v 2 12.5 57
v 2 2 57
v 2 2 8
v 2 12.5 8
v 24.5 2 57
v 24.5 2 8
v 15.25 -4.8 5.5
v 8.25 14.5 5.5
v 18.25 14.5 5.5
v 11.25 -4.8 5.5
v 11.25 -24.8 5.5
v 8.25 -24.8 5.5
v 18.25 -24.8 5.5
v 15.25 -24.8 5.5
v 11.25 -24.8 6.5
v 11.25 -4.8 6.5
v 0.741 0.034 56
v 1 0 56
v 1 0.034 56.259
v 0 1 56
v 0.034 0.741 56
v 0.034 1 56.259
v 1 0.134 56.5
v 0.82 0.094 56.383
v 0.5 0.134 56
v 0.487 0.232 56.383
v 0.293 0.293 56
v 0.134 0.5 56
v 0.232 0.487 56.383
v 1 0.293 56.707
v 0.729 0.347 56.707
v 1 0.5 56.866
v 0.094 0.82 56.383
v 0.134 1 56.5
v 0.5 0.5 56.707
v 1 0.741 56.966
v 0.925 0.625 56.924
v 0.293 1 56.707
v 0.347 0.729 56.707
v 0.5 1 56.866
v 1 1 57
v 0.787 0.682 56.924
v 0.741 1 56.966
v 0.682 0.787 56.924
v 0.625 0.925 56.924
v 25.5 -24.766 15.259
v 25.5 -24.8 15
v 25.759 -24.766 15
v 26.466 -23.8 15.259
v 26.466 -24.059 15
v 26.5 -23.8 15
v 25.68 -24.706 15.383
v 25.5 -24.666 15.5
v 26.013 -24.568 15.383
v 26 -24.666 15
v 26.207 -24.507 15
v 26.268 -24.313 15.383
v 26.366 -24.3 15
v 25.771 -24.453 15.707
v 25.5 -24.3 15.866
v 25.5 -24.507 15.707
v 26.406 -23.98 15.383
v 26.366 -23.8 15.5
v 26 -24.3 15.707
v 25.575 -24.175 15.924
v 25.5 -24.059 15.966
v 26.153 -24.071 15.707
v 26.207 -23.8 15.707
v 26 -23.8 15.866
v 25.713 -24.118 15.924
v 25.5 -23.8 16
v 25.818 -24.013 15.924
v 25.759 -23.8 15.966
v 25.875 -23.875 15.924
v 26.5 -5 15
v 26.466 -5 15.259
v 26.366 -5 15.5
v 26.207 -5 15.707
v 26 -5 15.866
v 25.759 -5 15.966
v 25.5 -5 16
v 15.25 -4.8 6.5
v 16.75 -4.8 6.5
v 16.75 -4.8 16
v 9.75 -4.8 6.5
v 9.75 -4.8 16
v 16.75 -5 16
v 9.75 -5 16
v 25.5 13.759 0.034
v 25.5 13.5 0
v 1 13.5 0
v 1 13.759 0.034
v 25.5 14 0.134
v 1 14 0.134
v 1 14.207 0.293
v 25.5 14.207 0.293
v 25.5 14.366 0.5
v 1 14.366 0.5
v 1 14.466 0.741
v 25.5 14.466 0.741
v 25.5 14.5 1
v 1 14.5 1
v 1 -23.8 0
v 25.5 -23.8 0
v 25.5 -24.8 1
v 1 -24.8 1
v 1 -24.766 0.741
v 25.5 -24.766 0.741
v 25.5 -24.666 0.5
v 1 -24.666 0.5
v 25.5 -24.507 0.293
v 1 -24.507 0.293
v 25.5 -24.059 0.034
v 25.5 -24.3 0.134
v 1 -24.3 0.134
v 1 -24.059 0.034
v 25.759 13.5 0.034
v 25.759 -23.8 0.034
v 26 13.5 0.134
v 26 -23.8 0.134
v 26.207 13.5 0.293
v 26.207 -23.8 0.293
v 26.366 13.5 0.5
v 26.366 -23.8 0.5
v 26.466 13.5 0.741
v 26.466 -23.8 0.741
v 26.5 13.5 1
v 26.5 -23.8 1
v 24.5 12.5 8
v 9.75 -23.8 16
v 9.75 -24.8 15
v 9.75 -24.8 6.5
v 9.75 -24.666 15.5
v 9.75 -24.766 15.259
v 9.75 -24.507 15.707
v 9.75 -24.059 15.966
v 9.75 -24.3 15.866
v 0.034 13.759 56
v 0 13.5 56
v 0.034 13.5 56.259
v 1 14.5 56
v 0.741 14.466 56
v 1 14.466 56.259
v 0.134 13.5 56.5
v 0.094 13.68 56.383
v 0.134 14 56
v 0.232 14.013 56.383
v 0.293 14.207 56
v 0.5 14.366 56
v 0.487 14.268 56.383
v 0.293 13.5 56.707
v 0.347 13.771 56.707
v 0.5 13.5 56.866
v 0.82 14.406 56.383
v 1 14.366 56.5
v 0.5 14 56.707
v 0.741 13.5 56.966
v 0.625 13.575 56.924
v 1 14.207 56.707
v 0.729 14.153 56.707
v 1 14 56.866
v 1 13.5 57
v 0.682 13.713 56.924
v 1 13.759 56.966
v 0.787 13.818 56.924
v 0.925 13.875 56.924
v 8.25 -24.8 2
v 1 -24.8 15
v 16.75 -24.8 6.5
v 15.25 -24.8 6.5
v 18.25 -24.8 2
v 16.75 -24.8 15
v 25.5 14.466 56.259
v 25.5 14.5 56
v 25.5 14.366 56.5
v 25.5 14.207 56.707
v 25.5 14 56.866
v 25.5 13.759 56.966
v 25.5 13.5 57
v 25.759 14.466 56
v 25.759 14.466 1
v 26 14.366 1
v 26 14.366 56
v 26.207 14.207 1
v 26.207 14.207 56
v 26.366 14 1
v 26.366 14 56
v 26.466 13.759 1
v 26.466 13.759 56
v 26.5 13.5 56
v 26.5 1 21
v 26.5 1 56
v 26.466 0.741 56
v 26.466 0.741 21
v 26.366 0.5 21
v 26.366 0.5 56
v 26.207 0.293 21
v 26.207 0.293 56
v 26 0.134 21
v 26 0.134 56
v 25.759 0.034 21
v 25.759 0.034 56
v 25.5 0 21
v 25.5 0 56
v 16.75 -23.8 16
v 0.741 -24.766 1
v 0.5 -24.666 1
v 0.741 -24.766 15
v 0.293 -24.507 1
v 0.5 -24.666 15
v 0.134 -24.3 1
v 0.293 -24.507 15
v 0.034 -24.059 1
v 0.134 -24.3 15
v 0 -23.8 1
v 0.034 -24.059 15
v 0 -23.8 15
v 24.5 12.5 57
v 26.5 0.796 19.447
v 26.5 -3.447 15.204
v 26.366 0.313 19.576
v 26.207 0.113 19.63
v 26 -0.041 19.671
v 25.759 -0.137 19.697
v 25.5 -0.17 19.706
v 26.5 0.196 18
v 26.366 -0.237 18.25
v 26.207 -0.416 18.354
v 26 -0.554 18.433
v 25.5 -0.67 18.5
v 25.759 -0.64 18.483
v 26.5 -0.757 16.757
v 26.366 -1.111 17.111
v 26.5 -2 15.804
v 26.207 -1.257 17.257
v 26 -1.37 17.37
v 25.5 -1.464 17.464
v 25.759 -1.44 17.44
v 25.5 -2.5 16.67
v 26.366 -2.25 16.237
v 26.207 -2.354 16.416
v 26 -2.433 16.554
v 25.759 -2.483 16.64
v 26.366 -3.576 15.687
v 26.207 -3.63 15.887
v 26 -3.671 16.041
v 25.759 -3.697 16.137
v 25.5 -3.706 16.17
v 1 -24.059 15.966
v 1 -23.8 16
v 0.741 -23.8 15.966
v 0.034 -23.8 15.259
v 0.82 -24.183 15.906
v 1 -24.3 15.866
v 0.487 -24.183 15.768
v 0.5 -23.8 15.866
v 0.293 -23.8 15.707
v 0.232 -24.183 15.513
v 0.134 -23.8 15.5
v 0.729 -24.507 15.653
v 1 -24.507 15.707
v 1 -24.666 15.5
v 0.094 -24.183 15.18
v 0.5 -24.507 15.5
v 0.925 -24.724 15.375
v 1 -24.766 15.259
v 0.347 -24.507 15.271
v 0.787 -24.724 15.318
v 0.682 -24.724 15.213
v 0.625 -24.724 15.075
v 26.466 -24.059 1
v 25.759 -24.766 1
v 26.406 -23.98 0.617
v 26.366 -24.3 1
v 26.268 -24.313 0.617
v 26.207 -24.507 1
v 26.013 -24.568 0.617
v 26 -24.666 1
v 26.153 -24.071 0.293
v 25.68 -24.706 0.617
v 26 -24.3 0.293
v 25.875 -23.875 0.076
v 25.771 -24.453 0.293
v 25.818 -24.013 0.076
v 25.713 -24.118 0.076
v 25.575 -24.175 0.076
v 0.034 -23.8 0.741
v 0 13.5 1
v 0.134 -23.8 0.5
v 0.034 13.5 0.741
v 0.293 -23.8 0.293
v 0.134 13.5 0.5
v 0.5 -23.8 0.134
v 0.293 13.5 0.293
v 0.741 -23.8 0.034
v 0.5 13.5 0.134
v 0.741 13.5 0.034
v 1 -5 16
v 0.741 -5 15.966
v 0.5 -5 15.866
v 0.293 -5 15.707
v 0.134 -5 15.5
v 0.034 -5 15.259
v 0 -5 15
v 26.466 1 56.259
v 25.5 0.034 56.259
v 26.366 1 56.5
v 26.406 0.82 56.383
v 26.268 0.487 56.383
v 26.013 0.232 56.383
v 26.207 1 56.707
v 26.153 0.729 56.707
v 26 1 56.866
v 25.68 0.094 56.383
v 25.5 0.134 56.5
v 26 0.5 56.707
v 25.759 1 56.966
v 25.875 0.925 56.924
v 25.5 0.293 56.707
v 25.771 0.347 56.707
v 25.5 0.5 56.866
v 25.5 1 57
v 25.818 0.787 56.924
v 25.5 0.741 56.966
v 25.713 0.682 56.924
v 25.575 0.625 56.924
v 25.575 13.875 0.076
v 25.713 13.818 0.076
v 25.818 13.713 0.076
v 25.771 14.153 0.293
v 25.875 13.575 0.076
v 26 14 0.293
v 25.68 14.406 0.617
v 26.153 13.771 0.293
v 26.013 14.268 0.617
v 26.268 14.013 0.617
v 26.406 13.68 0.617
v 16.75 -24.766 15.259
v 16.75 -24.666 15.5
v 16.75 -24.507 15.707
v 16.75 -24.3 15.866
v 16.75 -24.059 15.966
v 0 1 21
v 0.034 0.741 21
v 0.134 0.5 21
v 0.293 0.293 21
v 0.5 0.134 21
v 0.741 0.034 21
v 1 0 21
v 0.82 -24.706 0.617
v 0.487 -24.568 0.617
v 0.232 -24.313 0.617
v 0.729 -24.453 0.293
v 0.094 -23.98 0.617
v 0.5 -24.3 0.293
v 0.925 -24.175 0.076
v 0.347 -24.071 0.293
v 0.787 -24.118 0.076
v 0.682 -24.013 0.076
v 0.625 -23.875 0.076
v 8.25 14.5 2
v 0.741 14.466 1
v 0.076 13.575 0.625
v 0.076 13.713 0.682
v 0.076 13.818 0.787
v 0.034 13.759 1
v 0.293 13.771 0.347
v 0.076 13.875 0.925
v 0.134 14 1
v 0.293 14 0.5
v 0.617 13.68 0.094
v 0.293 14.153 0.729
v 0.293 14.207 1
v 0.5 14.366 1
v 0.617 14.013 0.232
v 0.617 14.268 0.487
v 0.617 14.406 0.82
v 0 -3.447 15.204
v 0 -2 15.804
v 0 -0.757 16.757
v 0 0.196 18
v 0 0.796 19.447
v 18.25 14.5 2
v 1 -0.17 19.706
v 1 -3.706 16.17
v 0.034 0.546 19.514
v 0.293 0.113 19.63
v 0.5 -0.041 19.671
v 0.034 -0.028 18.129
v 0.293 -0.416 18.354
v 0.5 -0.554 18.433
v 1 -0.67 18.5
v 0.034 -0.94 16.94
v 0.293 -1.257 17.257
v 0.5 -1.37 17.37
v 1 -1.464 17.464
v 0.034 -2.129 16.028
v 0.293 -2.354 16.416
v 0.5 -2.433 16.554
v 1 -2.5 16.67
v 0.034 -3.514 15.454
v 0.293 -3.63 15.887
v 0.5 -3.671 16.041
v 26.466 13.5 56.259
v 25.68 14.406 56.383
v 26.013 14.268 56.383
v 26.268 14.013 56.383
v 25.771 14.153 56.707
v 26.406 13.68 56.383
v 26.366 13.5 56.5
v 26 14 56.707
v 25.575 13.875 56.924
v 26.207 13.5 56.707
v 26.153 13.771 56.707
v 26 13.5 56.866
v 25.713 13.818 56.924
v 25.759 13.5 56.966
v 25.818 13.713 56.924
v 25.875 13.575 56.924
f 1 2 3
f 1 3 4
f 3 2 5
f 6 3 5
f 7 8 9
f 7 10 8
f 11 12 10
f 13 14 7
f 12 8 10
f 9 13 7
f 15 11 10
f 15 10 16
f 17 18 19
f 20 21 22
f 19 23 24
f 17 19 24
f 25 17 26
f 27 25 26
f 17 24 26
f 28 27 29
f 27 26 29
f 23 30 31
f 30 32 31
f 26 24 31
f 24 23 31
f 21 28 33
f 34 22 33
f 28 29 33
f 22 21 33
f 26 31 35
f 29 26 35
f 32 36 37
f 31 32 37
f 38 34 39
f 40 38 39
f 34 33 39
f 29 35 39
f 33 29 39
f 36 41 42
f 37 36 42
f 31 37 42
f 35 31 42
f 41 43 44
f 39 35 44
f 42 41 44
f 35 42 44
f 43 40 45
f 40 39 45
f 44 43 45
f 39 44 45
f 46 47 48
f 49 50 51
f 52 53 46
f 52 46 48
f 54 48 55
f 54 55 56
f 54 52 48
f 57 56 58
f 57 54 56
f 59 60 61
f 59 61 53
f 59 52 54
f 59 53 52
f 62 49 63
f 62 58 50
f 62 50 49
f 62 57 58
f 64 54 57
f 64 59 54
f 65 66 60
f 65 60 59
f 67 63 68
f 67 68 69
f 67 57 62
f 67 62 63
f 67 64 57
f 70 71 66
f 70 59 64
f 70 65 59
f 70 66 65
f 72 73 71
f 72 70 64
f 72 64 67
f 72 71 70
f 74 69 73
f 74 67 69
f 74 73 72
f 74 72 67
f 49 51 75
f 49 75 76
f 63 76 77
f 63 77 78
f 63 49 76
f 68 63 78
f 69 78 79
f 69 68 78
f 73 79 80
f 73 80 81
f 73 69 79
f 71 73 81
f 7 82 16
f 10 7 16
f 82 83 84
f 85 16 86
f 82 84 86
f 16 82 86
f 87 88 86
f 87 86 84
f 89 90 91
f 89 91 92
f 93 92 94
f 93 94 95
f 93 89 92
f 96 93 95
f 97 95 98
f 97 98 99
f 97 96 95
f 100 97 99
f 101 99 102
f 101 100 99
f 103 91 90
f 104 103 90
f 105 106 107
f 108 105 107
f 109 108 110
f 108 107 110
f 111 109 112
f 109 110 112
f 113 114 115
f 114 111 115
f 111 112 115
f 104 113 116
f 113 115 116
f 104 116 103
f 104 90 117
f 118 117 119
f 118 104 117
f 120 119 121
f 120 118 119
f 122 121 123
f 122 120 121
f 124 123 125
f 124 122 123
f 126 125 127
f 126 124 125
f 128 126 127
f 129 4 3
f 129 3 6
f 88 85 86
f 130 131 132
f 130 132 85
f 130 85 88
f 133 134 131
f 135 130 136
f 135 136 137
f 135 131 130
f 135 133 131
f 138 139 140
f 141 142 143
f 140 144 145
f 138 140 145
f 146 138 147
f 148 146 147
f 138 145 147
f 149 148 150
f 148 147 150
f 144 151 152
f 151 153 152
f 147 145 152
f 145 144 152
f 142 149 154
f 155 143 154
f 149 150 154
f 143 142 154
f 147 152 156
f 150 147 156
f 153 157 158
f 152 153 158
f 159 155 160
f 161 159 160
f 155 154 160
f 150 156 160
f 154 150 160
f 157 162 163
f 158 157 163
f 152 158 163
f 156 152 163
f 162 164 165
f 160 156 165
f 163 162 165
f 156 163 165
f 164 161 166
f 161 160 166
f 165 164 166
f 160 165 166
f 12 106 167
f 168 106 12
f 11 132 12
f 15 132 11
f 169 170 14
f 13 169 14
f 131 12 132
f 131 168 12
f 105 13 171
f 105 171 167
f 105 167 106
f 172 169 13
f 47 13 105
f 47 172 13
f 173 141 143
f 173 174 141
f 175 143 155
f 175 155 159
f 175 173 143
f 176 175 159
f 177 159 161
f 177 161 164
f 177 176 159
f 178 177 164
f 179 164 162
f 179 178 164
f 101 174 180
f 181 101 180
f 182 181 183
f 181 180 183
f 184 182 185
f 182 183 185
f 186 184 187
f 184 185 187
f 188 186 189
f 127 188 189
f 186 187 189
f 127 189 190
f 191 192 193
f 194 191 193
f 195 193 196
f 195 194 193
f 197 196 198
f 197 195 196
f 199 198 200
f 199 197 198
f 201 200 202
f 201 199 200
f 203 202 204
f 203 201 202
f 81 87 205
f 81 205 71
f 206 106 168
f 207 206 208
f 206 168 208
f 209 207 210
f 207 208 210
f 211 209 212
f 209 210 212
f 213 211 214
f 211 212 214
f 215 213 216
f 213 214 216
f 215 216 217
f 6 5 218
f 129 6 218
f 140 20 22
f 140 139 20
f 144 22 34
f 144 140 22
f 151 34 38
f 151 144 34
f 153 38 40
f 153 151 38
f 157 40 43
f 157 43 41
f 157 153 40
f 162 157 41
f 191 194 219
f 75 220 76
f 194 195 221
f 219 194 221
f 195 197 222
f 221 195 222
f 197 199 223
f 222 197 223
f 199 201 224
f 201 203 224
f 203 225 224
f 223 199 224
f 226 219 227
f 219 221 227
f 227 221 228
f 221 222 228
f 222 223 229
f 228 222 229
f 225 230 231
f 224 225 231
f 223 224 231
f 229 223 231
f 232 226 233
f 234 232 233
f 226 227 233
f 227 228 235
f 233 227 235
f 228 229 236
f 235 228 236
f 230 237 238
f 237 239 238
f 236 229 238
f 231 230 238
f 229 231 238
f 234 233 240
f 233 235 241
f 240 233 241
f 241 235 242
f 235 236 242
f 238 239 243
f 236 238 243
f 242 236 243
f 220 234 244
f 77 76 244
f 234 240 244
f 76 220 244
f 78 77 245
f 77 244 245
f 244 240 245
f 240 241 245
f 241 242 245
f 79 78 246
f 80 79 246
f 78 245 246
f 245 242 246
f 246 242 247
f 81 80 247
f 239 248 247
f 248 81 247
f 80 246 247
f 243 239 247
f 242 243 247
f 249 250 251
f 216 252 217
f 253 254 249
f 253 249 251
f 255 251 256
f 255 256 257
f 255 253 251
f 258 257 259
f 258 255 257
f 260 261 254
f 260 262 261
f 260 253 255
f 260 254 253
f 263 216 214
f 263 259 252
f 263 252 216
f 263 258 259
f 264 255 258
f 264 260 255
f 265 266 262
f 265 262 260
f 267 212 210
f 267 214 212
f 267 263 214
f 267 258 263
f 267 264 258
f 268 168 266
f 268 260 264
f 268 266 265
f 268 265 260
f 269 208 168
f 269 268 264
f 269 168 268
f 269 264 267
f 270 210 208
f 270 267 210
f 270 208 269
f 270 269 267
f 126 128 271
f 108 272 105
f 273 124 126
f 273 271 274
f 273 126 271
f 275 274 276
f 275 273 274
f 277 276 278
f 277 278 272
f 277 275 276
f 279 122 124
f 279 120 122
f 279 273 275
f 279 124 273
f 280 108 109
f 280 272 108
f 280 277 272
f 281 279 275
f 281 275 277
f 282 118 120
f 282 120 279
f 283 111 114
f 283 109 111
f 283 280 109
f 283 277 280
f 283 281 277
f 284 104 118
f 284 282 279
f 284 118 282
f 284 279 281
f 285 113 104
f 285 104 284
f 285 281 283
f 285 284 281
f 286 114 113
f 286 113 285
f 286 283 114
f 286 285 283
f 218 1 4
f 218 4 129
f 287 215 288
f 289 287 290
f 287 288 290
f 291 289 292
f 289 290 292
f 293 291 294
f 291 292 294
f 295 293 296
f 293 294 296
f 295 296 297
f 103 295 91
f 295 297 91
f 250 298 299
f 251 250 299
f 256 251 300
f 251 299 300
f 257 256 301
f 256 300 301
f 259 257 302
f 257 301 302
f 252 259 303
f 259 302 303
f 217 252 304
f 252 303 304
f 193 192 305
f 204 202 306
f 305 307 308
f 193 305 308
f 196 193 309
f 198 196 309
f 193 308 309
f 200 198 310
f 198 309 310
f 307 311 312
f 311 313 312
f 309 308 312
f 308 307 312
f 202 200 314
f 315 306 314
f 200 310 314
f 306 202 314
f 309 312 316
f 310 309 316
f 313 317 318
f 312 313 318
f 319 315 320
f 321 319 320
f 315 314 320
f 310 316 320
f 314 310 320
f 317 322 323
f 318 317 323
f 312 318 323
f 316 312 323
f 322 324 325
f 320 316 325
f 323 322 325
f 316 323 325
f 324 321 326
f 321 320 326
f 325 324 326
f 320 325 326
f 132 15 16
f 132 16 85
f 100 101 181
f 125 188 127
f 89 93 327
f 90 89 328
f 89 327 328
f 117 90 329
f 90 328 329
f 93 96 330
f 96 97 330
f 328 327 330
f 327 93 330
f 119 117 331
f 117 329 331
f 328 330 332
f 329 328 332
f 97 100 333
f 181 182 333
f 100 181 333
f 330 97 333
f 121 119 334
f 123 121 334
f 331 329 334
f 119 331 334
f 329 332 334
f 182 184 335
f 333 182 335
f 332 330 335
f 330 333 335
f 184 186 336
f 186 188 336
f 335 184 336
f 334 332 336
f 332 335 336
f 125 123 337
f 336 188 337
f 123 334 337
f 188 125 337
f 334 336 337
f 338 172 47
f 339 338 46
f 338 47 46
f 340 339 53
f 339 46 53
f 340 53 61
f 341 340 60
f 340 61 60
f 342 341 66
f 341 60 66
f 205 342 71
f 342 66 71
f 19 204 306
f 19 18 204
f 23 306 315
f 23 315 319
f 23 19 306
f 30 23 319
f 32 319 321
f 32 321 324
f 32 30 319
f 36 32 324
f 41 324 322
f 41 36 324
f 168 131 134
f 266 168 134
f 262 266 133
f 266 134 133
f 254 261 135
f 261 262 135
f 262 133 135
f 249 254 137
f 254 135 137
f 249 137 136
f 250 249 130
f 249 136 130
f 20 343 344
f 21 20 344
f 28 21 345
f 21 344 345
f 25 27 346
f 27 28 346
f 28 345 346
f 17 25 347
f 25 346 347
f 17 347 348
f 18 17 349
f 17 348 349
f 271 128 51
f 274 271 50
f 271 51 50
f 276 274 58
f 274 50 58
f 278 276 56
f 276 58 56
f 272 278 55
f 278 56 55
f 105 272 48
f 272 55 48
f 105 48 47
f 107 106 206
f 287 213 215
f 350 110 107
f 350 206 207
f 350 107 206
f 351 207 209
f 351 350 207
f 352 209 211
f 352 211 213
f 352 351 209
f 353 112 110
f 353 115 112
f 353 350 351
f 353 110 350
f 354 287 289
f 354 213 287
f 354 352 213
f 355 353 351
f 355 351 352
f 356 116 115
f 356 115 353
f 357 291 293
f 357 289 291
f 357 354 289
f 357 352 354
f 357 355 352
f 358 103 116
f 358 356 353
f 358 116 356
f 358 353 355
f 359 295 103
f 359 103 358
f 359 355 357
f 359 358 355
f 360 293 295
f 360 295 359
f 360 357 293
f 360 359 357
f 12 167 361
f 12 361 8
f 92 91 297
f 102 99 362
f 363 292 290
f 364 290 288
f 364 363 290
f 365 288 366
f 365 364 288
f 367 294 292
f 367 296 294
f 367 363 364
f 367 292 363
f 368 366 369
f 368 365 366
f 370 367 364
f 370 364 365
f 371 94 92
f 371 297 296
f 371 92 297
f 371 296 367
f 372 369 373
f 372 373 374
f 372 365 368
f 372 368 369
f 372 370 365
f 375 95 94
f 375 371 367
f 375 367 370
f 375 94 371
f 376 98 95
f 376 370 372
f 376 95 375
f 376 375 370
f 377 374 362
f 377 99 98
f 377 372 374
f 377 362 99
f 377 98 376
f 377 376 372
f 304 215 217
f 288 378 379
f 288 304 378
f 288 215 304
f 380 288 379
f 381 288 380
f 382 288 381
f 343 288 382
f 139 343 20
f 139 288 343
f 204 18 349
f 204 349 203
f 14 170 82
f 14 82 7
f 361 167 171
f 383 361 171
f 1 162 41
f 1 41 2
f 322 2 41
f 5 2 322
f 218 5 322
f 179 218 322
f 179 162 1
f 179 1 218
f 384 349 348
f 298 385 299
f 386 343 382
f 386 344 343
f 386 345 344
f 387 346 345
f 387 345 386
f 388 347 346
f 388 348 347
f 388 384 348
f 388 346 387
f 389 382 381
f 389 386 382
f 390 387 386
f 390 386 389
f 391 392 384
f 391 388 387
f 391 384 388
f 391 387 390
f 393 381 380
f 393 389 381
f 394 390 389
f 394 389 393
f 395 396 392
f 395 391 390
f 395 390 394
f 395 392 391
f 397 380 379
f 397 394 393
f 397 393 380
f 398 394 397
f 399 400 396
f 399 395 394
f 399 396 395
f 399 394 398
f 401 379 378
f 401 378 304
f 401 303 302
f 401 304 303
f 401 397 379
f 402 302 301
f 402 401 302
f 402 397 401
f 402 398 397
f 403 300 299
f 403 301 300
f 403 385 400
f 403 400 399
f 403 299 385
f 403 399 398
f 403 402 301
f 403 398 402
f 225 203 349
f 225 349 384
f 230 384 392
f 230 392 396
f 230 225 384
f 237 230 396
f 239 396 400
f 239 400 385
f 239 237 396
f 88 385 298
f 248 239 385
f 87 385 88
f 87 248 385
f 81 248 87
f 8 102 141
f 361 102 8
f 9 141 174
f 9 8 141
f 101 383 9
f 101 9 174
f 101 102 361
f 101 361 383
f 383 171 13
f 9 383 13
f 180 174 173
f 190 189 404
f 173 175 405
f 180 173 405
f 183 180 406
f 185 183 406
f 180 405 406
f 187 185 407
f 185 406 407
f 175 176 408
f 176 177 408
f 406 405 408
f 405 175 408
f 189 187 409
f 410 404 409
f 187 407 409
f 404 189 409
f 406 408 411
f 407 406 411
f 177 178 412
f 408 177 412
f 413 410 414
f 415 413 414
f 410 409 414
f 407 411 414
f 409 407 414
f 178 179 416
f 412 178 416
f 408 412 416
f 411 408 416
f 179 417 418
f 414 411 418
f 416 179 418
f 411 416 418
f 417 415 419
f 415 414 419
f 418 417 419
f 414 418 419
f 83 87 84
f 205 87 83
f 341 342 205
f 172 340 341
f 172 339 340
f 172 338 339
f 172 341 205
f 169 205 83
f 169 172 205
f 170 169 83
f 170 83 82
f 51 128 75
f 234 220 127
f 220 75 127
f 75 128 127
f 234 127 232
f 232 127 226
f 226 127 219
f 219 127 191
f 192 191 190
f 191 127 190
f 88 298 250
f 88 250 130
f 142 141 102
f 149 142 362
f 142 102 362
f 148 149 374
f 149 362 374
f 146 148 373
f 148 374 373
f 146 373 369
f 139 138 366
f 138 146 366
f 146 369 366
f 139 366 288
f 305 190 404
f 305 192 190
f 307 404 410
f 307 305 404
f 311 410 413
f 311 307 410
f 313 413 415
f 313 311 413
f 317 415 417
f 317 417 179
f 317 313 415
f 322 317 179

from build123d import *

# Parameters (mm, degrees)
SKETCH_2_W          = 26.5
SKETCH_2_H          = 14.5
EXTRUDE_1_DEPTH     = 57
SKETCH_6_W          = 22.5
SKETCH_6_H          = 10.5
CUT_EXTRUDE_1_DEPTH = 49
SKETCH_7_W          = 26.5
SKETCH_7_H          = 16
EXTRUDE_2_DEPTH     = 24.8
FILLET_1_R          = 5
FILLET_2_R          = 1
FILLET_4_R          = 1
FILLET_5_R          = 1
FILLET_6_R          = 1
CUT_EXTRUDE_2_DEPTH = 20
SKETCH_10_W         = 10
SKETCH_10_H         = 3.5
CUT_EXTRUDE_3_DEPTH = 40


with BuildPart() as part:
    # ｽｹｯﾁ2 → ﾎﾞｽ - 押し出し1 (new body)
    with BuildSketch(Plane.XY):
        with Locations((13.25, 7.25)):
            Rectangle(SKETCH_2_W, SKETCH_2_H)
    extrude(amount=EXTRUDE_1_DEPTH)

    # ｽｹｯﾁ6 → ｶｯﾄ - 押し出し1 (cut)
    with BuildSketch(Plane.XY.offset(57)):
        with Locations((13.25, 7.25)):
            Rectangle(SKETCH_6_W, SKETCH_6_H)
    extrude(amount=-CUT_EXTRUDE_1_DEPTH, mode=Mode.SUBTRACT)

    # ｽｹｯﾁ7 → ﾎﾞｽ - 押し出し2 (add)
    with BuildSketch(Plane.XZ):
        with Locations((13.25, 8)):
            Rectangle(SKETCH_7_W, SKETCH_7_H)
    extrude(amount=EXTRUDE_2_DEPTH)

    # ﾌｨﾚｯﾄ1
    fillet_1_edges = [part.edges().sort_by_distance(p)[0] for p in [
        (13.25, 0, 16),
    ]]
    fillet(fillet_1_edges, radius=FILLET_1_R)

    # ﾌｨﾚｯﾄ2
    fillet_2_edges = [part.edges().sort_by_distance(p)[0] for p in [
        (26.5, 14.5, 28.5),
    ]]
    fillet(fillet_2_edges, radius=FILLET_2_R)

    # ﾌｨﾚｯﾄ4
    fillet_4_edges = [part.edges().sort_by_distance(p)[0] for p in [
        (26.5, -14.9, 16),
        (26.5, -24.8, 8),
        (26.5, -1.464466094, 17.464466094),
        (12.75, 14.5, 0),
        (26.207106781, 14.207106781, 0),
        (26.5, -5.65, 0),
        (26.5, 0, 39),
    ]]
    fillet(fillet_4_edges, radius=FILLET_4_R)

    # ﾌｨﾚｯﾄ5
    # the kernel refuses this fillet: 1 mm, written as the material it takes off along each edge
    with BuildSketch(Plane(origin=(25.5, -23.8, 15), x_dir=(0, -1, 0), z_dir=(0, 0, 1))) as fillet_5_piece_1_section:
        Polygon((0, 0), (FILLET_5_R, 0), (FILLET_5_R, FILLET_5_R), (0, FILLET_5_R), align=None)
    fillet_5_piece_1 = extrude(amount=FILLET_5_R, mode=Mode.PRIVATE)
    fillet_5_piece_1 = fillet_5_piece_1 - Plane(origin=(25.5, -23.8, 15), x_dir=(-0.7071067811865475, 0.7071067811865475, 0), z_dir=(0, 0, 1)) * Sphere(FILLET_5_R, mode=Mode.PRIVATE)
    add(fillet_5_piece_1, mode=Mode.SUBTRACT)
    with BuildSketch(Plane(origin=(25.5, -23.8, 1), x_dir=(0, -1, 0), z_dir=(0, 0, -1))) as fillet_5_piece_2_section:
        Polygon((0, 0), (FILLET_5_R, 0), (FILLET_5_R, -FILLET_5_R), (0, -FILLET_5_R), align=None)
    fillet_5_piece_2 = extrude(amount=FILLET_5_R, mode=Mode.PRIVATE)
    fillet_5_piece_2 = fillet_5_piece_2 - Plane(origin=(25.5, -23.8, 1), x_dir=(-0.7071067811865475, 0.7071067811865475, 0), z_dir=(0, 0, -1)) * Sphere(FILLET_5_R, mode=Mode.PRIVATE)
    add(fillet_5_piece_2, mode=Mode.SUBTRACT)
    with BuildSketch(Plane(origin=(1, -23.8, 15), x_dir=(-1, 0, 0), z_dir=(0, -1, 0))) as fillet_5_piece_3_section:
        Polygon((0, 0), (FILLET_5_R, 0), (FILLET_5_R, -FILLET_5_R), (0, -FILLET_5_R), align=None)
    fillet_5_piece_3 = extrude(amount=FILLET_5_R, mode=Mode.PRIVATE)
    fillet_5_piece_3 = fillet_5_piece_3 - Plane(origin=(1, -23.8, 15), x_dir=(0.7071067811865475, 0, -0.7071067811865475), z_dir=(0, -1, 0)) * Sphere(FILLET_5_R, mode=Mode.PRIVATE)
    add(fillet_5_piece_3, mode=Mode.SUBTRACT)
    with BuildSketch(Plane(origin=(1, -23.8, 1), x_dir=(-1, 0, 0), z_dir=(0, 0, -1))) as fillet_5_piece_4_section:
        Polygon((0, 0), (FILLET_5_R, 0), (FILLET_5_R, -FILLET_5_R), (0, -FILLET_5_R), align=None)
    fillet_5_piece_4 = extrude(amount=FILLET_5_R, mode=Mode.PRIVATE)
    fillet_5_piece_4 = fillet_5_piece_4 - Plane(origin=(1, -23.8, 1), x_dir=(0.7071067811865475, 0.7071067811865475, 0), z_dir=(0, 0, -1)) * Sphere(FILLET_5_R, mode=Mode.PRIVATE)
    add(fillet_5_piece_4, mode=Mode.SUBTRACT)
    with BuildSketch(Plane(origin=(0, -5, 16), x_dir=(0, 0, -1), z_dir=(0, -1, 0))) as fillet_5_piece_5:
        with BuildLine():
            CenterArc((FILLET_5_R, FILLET_5_R), FILLET_5_R, 180, 90)
            Line((0, FILLET_5_R), (0, 0))
            Line((0, 0), (FILLET_5_R, 0))
        make_face()
    extrude(amount=18.8, mode=Mode.SUBTRACT)
    with BuildSketch(Plane(origin=(0, -24.8, 15), x_dir=(0, 1, 0), z_dir=(0, 0, -1))) as fillet_5_piece_6:
        with BuildLine():
            CenterArc((FILLET_5_R, FILLET_5_R), FILLET_5_R, 180, 90)
            Line((0, FILLET_5_R), (0, 0))
            Line((0, 0), (FILLET_5_R, 0))
        make_face()
    extrude(amount=14, mode=Mode.SUBTRACT)
    with BuildSketch(Plane(origin=(1, -24.8, 0), x_dir=(0, 1, 0), z_dir=(1, 0, 0)), Plane(origin=(25.5, -24.8, 16), x_dir=(0, 1, 0), z_dir=(-1, 0, 0))) as fillet_5_piece_7:
        with BuildLine():
            CenterArc((FILLET_5_R, FILLET_5_R), FILLET_5_R, 180, 90)
            Line((0, FILLET_5_R), (0, 0))
            Line((0, 0), (FILLET_5_R, 0))
        make_face()
    extrude(amount=24.5, mode=Mode.SUBTRACT)
    with BuildSketch(Plane(origin=(0, -5, 21), x_dir=(0, 1, 0), z_dir=(0, 0, 1))) as fillet_5_piece_8:
        with BuildLine():
            CenterArc((5 + FILLET_5_R, -FILLET_5_R), FILLET_5_R, 90, 90)
            Line((5, -FILLET_5_R), (5, 0))
            Line((5, 0), (5 + FILLET_5_R, 0))
        make_face()
    revolve(axis=Axis((0, -5, 21), (-1, 0, 0)), revolution_arc=90, mode=Mode.SUBTRACT)
    with BuildSketch(Plane(origin=(0, 13.5, 0), x_dir=(0, 0, 1), z_dir=(0, -1, 0))) as fillet_5_piece_9:
        with BuildLine():
            CenterArc((FILLET_5_R, -FILLET_5_R), FILLET_5_R, 90, 90)
            Line((0, -FILLET_5_R), (0, 0))
            Line((0, 0), (FILLET_5_R, 0))
        make_face()
    extrude(amount=37.3, mode=Mode.SUBTRACT)
    with BuildSketch(Plane(origin=(0, 13.5, 1), x_dir=(0, 0, -1), z_dir=(0, -1, 0))) as fillet_5_piece_10:
        with BuildLine():
            CenterArc((1 - FILLET_5_R, FILLET_5_R), FILLET_5_R, 270, 90)
            Line((1, FILLET_5_R), (1, 0))
            Line((1, 0), (1 - FILLET_5_R, 0))
        make_face()
    revolve(axis=Axis((0, 13.5, 1), (1, 0, 0)), revolution_arc=90, mode=Mode.SUBTRACT)
    with BuildSketch(Plane(origin=(0, 14.5, 1), x_dir=(1, 0, 0), z_dir=(0, 0, 1))) as fillet_5_piece_11:
        with BuildLine():
            CenterArc((FILLET_5_R, -FILLET_5_R), FILLET_5_R, 90, 90)
            Line((0, -FILLET_5_R), (0, 0))
            Line((0, 0), (FILLET_5_R, 0))
        make_face()
    extrude(amount=58.5, mode=Mode.SUBTRACT)
    with BuildSketch(Plane(origin=(0, 0, 21), x_dir=(1, 0, 0), z_dir=(0, 0, 1))) as fillet_5_piece_12:
        with BuildLine():
            CenterArc((FILLET_5_R, FILLET_5_R), FILLET_5_R, 180, 90)
            Line((0, FILLET_5_R), (0, 0))
            Line((0, 0), (FILLET_5_R, 0))
        make_face()
    extrude(amount=38.5, mode=Mode.SUBTRACT)

    # ﾌｨﾚｯﾄ6
    fillet_6_edges = [part.edges().sort_by_distance(p)[0] for p in [
        (13.25, 14.5, 57),
        (26.207106781, 14.207106781, 57),
        (26.5, 7.25, 57),
        (26.207106781, 0.292893219, 57),
        (0, 7.25, 57),
        (13.25, 0, 57),
        (0.292893219, 0.292893219, 57),
        (0.292893219, 14.207106781, 57),
    ]]
    fillet(fillet_6_edges, radius=FILLET_6_R)

    # ｽｹｯﾁ8 → ｶｯﾄ - 押し出し2 (cut)
    with BuildSketch(Plane.XZ.offset(24.8)):
        Polygon((9.75, 16), (16.75, 16), (16.75, 6.5), (15.25, 6.5), (15.25, 5.5), (18.25, 5.5), (18.25, 2), (8.25, 2), (8.25, 5.5), (11.25, 5.5), (11.25, 6.5), (9.75, 6.5), align=None)
    extrude(amount=-CUT_EXTRUDE_2_DEPTH, mode=Mode.SUBTRACT)

    # ｽｹｯﾁ10 → ｶｯﾄ - 押し出し3 (cut)
    with BuildSketch(Plane.XZ.offset(24.8)):
        with Locations((13.25, 3.75)):
            Rectangle(SKETCH_10_W, SKETCH_10_H)
    extrude(amount=-CUT_EXTRUDE_3_DEPTH, mode=Mode.SUBTRACT)


solid = part.part
